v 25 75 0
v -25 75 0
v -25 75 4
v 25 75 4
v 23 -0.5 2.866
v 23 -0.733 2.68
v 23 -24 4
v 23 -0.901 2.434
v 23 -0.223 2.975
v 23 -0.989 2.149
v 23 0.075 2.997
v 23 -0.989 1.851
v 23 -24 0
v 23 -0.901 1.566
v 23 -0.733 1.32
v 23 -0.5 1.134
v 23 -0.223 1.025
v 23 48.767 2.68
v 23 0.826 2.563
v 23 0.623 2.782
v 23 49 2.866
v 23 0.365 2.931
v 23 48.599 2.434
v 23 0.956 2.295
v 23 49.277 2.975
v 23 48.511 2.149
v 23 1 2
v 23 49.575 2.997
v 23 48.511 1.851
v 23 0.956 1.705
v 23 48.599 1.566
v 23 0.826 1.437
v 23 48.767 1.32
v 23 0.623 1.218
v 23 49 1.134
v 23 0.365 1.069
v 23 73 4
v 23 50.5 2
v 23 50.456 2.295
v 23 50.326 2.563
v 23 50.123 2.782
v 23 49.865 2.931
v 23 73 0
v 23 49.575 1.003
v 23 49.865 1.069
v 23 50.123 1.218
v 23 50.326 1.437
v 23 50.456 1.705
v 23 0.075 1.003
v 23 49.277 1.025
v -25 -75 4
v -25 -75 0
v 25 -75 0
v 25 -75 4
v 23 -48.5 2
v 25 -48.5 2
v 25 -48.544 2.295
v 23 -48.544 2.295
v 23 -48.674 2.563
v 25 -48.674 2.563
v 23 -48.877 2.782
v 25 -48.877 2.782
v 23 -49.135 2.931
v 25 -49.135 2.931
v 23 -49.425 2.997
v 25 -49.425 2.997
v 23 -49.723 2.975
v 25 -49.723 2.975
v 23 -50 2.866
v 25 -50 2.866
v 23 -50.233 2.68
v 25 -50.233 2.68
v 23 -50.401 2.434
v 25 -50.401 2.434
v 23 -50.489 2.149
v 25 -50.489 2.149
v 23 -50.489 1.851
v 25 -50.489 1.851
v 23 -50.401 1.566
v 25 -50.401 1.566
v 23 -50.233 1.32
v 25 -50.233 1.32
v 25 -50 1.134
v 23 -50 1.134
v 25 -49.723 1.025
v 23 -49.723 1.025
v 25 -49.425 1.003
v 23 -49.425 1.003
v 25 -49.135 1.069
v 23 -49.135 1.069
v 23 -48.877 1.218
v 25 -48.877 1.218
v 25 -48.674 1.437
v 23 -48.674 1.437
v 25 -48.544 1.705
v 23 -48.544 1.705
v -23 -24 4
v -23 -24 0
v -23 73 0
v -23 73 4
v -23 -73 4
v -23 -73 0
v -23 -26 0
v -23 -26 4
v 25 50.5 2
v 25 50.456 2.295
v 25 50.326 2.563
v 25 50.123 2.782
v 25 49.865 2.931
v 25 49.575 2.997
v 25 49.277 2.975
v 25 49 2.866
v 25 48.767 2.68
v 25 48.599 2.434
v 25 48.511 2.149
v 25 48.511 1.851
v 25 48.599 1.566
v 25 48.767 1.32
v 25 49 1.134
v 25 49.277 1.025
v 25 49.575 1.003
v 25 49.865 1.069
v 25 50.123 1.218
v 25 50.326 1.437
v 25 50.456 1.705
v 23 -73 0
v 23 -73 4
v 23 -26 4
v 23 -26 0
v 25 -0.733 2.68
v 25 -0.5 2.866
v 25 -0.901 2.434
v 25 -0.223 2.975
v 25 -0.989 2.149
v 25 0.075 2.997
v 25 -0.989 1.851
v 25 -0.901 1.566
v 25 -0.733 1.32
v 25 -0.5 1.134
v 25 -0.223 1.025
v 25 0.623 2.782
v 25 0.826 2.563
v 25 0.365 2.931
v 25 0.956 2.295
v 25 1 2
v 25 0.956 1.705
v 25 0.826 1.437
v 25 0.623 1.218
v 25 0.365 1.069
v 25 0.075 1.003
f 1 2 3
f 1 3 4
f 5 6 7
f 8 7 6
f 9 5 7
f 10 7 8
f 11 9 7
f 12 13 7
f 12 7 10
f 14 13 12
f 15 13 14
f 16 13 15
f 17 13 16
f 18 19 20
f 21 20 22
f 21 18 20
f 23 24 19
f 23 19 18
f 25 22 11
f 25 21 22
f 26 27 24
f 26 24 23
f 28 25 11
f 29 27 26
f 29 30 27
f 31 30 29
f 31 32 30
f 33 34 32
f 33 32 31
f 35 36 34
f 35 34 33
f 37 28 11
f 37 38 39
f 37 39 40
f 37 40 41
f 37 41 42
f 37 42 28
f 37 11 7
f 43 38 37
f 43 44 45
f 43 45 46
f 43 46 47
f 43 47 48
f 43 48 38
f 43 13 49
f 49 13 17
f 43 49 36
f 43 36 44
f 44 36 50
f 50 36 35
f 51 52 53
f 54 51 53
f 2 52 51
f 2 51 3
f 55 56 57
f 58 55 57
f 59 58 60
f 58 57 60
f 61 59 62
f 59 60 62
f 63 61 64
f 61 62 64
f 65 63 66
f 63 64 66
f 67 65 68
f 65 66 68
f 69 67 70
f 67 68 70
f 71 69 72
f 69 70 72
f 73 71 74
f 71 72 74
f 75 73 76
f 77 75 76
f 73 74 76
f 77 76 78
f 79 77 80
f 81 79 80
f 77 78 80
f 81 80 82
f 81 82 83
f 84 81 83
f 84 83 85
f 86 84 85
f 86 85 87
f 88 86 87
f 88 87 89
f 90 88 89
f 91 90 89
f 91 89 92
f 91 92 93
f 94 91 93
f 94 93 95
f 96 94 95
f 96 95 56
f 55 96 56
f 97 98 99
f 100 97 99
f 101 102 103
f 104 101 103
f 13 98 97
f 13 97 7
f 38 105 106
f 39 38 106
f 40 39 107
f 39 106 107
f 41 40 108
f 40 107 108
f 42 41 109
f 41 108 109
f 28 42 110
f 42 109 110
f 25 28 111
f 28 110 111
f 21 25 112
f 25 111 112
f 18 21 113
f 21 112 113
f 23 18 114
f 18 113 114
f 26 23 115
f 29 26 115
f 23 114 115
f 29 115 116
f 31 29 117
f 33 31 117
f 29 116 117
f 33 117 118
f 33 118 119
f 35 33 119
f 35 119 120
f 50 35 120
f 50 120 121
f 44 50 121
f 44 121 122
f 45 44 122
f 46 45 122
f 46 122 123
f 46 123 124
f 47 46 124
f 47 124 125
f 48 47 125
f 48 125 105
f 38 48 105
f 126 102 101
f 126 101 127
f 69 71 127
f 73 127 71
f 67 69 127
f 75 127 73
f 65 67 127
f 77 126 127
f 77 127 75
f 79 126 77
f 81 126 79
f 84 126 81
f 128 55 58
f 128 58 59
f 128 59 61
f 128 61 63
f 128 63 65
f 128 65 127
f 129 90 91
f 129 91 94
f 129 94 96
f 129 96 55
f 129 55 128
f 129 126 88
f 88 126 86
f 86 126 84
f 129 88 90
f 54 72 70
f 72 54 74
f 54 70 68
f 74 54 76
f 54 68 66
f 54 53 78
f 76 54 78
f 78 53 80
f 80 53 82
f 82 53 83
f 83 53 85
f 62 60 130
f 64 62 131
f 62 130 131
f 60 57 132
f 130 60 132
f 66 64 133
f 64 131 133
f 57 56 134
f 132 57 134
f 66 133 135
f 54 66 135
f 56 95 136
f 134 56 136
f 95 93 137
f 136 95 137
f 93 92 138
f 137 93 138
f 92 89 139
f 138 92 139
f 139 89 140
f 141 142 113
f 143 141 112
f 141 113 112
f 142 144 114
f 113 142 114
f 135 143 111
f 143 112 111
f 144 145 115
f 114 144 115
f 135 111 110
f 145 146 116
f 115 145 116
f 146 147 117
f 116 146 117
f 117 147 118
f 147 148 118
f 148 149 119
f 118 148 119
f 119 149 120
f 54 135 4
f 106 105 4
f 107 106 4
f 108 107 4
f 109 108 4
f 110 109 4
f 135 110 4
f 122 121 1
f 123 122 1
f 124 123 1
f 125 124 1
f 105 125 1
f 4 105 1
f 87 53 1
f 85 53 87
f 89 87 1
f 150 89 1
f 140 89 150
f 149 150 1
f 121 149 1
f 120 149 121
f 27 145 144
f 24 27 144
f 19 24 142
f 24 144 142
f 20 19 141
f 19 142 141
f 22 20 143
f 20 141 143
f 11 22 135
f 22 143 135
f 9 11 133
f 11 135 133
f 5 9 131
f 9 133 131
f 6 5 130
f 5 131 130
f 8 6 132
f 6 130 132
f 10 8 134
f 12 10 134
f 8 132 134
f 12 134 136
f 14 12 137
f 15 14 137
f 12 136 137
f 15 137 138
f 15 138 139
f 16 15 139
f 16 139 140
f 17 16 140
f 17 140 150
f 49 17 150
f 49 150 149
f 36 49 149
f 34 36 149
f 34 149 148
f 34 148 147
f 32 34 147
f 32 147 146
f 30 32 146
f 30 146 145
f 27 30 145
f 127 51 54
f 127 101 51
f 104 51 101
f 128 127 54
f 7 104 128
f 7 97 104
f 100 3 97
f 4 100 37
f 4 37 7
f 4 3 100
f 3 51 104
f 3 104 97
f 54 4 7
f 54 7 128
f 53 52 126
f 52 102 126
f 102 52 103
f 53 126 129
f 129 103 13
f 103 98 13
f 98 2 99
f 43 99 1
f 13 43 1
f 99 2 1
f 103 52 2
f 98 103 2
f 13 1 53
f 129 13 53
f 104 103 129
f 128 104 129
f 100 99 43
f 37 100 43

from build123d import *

# Parameters (mm, degrees)
F0_W     = 50
F0_H     = 150
F0_W_2   = 46
F0_H_2   = 47
F0_H_3   = 97
F1_DEPTH = 4
F2_R     = 1
F3_DEPTH = 25


with BuildPart() as f1:
    # F0 (on Top) → F1 (new body)
    with BuildSketch(Plane.XY):
        Rectangle(F0_W, F0_H)
        with Locations((0, -49.5)):
            Rectangle(F0_W_2, F0_H_2, mode=Mode.SUBTRACT)
        with Locations((0, 24.5)):
            Rectangle(F0_W_2, F0_H_3, mode=Mode.SUBTRACT)
    extrude(amount=F1_DEPTH)

    # F2 (on face) → F3 (cut)
    with BuildSketch(Plane.YZ.offset(25)):
        with Locations((-49.5, 2)):
            Circle(F2_R)
        with Locations((0, 2)):
            Circle(F2_R)
        with Locations((49.5, 2)):
            Circle(F2_R)
    extrude(amount=-F3_DEPTH, mode=Mode.SUBTRACT)


solid = f1.part
